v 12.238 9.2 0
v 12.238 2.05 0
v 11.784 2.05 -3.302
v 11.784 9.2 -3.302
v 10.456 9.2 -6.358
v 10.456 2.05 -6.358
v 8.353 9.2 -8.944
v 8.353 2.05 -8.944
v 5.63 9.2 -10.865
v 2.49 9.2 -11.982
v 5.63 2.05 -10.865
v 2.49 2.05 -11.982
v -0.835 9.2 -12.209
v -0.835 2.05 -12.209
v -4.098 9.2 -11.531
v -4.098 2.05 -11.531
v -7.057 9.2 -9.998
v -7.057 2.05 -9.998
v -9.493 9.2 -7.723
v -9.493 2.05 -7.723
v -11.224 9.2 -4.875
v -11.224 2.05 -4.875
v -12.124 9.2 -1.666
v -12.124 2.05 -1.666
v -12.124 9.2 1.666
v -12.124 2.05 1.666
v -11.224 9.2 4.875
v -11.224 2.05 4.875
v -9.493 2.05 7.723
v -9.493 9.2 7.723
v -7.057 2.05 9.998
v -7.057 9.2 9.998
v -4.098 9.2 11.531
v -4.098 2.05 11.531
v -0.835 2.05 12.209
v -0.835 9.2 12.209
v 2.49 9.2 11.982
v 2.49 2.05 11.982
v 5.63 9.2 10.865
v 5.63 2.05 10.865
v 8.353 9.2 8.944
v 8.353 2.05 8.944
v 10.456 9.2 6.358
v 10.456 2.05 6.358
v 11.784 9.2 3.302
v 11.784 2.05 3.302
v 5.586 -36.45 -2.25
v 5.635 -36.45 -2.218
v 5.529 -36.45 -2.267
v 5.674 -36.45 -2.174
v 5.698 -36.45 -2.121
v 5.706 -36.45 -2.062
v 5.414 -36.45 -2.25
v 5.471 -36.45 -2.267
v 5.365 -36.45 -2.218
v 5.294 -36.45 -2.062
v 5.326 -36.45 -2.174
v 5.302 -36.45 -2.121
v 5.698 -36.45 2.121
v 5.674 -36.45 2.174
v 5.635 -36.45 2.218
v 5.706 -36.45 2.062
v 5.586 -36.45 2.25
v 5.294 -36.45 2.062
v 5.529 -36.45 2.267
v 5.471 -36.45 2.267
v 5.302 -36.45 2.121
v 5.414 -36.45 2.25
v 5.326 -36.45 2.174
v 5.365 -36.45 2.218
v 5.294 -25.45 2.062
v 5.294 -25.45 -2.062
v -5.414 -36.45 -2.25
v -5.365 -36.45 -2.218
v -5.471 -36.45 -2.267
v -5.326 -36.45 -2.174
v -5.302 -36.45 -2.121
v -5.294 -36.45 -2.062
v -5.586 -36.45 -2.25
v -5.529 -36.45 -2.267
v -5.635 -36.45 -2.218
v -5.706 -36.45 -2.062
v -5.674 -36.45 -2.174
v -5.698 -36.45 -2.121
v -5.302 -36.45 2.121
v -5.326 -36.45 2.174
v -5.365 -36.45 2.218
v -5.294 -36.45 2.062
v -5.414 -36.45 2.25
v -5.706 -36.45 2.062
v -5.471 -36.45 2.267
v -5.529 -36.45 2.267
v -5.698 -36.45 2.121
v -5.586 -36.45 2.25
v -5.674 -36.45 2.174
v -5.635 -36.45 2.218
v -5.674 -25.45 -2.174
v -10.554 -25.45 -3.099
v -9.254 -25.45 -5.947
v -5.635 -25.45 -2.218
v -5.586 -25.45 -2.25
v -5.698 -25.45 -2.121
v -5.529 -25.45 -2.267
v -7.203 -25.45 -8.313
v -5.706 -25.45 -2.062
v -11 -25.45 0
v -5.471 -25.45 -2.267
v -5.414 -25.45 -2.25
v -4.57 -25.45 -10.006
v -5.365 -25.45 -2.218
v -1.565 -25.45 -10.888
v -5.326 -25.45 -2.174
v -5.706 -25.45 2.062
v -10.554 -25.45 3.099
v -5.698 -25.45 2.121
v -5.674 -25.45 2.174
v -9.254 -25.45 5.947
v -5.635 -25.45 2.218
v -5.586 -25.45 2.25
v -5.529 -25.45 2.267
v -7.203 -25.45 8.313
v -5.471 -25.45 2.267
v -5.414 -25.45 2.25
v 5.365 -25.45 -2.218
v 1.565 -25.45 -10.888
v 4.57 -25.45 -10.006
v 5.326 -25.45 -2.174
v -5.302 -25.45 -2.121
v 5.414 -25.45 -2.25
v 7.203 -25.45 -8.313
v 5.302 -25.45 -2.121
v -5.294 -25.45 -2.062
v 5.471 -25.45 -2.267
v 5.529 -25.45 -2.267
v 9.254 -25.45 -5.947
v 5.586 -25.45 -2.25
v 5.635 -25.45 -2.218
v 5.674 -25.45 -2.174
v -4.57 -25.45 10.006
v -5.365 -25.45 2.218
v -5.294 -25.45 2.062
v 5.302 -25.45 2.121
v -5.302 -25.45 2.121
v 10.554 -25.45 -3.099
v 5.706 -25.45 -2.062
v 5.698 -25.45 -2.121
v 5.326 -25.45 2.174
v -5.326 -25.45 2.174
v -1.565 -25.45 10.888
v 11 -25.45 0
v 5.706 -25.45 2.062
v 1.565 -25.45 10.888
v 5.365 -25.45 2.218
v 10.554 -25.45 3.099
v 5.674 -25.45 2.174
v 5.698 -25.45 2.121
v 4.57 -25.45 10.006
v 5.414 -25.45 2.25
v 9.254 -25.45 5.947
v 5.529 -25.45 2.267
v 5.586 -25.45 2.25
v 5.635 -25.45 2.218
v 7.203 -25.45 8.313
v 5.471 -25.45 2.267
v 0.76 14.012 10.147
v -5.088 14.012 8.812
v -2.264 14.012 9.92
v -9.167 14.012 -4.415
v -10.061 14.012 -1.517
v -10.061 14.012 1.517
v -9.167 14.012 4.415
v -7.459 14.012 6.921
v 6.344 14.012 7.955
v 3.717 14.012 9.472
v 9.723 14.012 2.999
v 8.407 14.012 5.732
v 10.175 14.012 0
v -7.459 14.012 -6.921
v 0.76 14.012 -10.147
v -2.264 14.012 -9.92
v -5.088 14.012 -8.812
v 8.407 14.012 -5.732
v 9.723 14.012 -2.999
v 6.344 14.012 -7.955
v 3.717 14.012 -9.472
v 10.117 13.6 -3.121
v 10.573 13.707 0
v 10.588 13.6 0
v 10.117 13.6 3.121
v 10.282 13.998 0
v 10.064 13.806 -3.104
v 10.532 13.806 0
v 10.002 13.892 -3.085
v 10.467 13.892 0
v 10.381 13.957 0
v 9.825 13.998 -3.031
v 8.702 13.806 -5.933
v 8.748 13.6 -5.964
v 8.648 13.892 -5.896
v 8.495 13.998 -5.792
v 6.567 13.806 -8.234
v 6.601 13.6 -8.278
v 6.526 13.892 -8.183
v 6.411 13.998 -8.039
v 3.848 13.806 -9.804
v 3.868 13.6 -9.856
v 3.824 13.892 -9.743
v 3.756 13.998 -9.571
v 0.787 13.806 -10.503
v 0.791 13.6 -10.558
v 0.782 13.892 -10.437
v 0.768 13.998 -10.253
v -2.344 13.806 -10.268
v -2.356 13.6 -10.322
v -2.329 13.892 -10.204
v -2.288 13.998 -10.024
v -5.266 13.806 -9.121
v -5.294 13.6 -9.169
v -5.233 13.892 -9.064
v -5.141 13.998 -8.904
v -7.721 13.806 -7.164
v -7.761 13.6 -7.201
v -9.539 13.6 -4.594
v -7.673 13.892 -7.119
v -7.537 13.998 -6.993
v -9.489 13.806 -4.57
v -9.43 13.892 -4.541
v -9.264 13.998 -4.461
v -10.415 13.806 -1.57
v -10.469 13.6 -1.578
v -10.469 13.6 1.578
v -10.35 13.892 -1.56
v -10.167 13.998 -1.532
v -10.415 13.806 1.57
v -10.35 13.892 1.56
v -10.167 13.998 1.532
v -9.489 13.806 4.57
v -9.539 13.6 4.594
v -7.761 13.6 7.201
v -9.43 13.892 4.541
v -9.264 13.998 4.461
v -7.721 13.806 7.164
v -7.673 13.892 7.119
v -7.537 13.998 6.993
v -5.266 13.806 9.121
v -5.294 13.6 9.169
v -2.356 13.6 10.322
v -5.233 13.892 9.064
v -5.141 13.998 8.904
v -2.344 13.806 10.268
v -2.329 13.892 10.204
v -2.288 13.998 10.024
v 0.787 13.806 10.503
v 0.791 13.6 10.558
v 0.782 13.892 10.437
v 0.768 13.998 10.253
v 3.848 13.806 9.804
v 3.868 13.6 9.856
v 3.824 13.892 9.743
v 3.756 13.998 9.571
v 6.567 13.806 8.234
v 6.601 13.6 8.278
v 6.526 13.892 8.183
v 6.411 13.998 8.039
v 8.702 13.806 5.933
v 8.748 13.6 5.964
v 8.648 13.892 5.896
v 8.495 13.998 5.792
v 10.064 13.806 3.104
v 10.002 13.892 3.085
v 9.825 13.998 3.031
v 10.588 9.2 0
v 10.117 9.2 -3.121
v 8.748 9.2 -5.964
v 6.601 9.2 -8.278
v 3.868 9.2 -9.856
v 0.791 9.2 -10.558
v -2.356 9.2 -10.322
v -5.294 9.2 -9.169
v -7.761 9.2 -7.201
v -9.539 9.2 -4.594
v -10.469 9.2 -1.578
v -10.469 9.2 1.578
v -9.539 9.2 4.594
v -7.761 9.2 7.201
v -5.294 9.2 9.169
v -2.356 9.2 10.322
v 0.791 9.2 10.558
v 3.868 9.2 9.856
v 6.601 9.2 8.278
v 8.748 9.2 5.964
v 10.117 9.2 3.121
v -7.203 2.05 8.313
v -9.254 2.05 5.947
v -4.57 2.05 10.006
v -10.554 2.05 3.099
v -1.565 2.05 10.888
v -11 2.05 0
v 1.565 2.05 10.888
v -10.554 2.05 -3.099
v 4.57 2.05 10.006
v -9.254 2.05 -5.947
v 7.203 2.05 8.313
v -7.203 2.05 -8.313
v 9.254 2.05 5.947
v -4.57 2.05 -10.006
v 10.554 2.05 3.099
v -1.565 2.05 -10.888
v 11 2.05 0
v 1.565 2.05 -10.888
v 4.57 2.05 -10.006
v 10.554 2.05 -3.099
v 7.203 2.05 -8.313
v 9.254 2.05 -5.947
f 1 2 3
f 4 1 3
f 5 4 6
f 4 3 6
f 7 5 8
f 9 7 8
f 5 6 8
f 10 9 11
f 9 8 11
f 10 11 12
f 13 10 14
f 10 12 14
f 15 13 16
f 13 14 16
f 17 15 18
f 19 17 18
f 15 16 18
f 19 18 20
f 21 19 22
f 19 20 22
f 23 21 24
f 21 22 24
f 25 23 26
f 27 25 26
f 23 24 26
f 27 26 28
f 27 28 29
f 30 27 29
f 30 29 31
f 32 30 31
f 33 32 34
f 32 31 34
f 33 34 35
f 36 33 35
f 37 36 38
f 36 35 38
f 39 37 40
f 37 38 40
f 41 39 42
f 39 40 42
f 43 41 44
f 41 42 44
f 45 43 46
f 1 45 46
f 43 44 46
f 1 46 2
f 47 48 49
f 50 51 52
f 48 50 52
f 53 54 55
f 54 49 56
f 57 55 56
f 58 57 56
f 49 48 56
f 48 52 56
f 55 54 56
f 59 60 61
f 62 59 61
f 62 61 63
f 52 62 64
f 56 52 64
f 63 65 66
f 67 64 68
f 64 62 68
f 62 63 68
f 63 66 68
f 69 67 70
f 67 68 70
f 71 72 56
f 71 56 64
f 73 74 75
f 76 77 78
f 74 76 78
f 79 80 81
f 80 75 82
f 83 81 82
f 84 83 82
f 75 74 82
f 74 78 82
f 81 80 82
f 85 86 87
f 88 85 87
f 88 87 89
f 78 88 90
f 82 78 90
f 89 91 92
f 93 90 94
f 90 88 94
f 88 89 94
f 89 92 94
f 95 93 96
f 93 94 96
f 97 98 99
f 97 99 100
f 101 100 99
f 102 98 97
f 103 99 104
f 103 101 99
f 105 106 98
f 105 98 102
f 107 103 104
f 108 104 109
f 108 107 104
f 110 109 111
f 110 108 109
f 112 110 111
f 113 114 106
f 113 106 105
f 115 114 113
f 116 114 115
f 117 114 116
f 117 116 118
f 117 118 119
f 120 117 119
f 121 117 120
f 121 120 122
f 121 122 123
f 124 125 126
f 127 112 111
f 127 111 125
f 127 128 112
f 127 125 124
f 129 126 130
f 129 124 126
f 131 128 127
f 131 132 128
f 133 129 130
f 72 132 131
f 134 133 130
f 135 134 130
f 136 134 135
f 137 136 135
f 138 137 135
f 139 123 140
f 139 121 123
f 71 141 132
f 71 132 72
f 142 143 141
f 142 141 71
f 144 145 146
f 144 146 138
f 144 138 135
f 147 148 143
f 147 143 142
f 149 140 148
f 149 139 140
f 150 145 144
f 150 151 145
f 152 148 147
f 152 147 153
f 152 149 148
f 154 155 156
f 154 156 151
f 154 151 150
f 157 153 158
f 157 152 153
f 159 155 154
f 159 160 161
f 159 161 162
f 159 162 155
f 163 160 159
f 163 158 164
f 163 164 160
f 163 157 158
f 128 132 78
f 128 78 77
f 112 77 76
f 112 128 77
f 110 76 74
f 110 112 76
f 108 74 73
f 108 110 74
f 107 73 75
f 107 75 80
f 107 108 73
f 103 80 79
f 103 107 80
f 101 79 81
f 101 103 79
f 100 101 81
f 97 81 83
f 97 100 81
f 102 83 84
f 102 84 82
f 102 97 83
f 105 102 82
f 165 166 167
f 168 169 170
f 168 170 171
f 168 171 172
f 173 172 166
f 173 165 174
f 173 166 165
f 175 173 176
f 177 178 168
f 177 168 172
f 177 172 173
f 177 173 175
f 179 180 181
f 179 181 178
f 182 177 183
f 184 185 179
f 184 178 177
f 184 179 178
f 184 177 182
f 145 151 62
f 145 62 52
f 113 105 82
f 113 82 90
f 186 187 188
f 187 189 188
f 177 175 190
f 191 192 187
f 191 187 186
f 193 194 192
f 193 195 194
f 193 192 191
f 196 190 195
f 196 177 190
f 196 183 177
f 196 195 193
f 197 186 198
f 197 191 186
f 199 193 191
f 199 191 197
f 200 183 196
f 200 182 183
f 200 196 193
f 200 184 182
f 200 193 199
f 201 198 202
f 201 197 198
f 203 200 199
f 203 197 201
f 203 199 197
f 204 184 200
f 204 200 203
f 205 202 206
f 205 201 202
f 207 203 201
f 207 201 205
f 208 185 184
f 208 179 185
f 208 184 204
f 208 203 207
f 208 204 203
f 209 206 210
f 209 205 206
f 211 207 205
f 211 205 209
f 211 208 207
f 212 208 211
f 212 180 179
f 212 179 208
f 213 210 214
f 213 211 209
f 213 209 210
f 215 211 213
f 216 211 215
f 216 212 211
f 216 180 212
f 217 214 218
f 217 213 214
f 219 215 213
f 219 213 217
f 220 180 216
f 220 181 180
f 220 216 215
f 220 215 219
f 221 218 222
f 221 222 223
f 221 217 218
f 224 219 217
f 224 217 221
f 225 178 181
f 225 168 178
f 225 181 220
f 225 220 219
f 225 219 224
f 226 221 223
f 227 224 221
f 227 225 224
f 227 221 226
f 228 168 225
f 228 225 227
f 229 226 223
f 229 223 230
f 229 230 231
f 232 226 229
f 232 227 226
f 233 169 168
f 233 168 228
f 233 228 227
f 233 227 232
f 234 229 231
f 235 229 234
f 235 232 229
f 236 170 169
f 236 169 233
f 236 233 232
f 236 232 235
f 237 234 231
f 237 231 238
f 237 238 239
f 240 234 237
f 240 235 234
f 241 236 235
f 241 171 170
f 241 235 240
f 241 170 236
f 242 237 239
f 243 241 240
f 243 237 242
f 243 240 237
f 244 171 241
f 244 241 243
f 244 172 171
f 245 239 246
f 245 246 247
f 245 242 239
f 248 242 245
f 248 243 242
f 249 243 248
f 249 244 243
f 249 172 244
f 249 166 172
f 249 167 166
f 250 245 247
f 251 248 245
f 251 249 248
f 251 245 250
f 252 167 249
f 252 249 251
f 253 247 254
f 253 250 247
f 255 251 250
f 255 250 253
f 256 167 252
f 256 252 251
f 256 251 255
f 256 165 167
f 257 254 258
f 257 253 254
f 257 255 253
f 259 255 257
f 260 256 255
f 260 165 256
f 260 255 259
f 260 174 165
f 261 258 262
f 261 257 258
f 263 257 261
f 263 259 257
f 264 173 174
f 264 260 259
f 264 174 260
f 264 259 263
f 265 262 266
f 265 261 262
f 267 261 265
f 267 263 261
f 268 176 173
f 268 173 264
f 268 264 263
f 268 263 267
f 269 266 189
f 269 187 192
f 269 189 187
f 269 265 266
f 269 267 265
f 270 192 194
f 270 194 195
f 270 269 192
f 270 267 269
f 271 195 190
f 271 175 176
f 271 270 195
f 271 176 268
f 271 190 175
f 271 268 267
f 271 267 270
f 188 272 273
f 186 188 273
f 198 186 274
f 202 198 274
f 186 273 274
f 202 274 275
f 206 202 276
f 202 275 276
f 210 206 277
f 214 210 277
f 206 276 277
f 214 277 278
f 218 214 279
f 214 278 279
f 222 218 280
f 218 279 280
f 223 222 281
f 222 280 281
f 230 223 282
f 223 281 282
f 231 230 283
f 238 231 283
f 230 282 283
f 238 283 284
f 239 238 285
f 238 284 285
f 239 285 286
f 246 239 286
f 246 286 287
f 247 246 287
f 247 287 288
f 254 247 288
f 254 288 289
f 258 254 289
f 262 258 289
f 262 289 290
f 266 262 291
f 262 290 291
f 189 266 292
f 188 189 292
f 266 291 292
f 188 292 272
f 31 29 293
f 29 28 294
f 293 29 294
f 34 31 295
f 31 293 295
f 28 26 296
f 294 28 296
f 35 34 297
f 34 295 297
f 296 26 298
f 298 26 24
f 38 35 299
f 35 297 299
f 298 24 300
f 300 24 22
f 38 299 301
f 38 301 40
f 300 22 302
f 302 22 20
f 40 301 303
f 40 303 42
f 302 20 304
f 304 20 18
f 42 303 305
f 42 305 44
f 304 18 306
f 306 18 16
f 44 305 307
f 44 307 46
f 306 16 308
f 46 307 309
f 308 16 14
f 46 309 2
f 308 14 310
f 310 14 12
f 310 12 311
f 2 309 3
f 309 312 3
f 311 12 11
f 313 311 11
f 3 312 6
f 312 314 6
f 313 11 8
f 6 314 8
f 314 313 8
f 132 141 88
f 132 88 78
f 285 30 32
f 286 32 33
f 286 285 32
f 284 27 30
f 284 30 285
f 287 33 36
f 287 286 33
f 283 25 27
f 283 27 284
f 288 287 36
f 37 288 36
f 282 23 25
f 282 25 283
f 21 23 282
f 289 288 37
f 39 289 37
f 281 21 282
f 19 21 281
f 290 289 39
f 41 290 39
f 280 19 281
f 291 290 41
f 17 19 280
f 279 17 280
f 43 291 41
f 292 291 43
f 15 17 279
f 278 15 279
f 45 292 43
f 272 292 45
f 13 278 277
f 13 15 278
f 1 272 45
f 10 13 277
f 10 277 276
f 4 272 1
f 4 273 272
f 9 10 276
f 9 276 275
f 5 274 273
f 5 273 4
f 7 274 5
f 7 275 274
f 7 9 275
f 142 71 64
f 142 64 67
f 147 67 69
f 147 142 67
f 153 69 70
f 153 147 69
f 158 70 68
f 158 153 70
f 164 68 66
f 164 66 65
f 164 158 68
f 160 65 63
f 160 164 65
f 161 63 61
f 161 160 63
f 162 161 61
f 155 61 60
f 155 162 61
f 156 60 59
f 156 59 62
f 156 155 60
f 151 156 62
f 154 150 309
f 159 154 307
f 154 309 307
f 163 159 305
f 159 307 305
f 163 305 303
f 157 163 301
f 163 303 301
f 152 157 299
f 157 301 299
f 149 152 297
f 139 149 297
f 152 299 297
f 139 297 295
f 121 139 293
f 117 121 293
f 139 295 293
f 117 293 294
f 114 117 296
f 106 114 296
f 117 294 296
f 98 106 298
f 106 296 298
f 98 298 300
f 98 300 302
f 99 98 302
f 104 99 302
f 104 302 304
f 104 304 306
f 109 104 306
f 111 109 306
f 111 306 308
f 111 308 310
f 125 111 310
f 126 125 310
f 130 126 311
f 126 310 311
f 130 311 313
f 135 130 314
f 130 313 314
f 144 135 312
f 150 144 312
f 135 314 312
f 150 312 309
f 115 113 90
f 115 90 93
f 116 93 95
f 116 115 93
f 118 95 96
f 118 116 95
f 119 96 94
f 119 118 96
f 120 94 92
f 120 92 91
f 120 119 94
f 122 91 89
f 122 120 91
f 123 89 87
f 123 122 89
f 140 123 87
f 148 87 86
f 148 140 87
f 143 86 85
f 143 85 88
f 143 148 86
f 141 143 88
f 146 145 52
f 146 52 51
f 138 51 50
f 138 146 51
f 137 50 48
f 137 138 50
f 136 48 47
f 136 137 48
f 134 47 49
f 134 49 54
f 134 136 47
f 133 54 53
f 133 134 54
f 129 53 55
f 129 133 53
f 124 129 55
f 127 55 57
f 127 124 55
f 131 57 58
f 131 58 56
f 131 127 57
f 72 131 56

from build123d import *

# Parameters (mm, degrees)
SKETCH1_R           = 8.9
BOSS_EXTRUDE1_DEPTH = 5.2
SKETCH2_R           = 8
BOSS_EXTRUDE2_DEPTH = 20
BOSS_EXTRUDE3_DEPTH = 8
SKETCH4_R           = 7.7
BOSS_EXTRUDE4_DEPTH = 3.5
FILLET1_R           = 0.3
SCALE1_SCALE        = 1.375


with BuildPart() as part:
    # Sketch1 → Boss-Extrude1 (new body)
    with BuildSketch(Plane(origin=(0, 0, 0), x_dir=(1, 0, 0), z_dir=(0, 1, 0))):
        Circle(SKETCH1_R)
    extrude(amount=BOSS_EXTRUDE1_DEPTH)

    # Sketch2 → Boss-Extrude2 (add)
    with BuildSketch(Plane.XZ):
        Circle(SKETCH2_R)
    extrude(amount=BOSS_EXTRUDE2_DEPTH)

    # Sketch3 → Boss-Extrude3 (add)
    with BuildSketch(Plane.XZ.offset(20)):
        with BuildLine():
            Line((4.15, 1.5), (4.15, -1.5))
            ThreePointArc((4.15, -1.5), (4, -1.65), (3.85, -1.5))
            Line((3.85, -1.5), (3.85, 1.5))
            ThreePointArc((3.85, 1.5), (4, 1.65), (4.15, 1.5))
        make_face()
        with BuildLine():
            Line((-3.85, 1.5), (-3.85, -1.5))
            ThreePointArc((-3.85, -1.5), (-4, -1.65), (-4.15, -1.5))
            Line((-4.15, -1.5), (-4.15, 1.5))
            ThreePointArc((-4.15, 1.5), (-4, 1.65), (-3.85, 1.5))
        make_face()
    extrude(amount=BOSS_EXTRUDE3_DEPTH)

    # Sketch4 → Boss-Extrude4 (add)
    with BuildSketch(Plane(origin=(0, 5.2, 0), x_dir=(1, 0, 0), z_dir=(0, 1, 0))):
        Circle(SKETCH4_R)
    extrude(amount=BOSS_EXTRUDE4_DEPTH)

    # Fillet1
    fillet1_edges = [part.edges().sort_by_distance(p)[0] for p in [
        (-7.7, 8.7, 0),
    ]]
    fillet(fillet1_edges, radius=FILLET1_R)


with BuildPart() as part_1:
    # Scale1: scaled about (0, -5.466249854, 0)
    add(part.part.scale(SCALE1_SCALE).moved(Location((0, 2.049843695, 0))))


solid = part_1.part
